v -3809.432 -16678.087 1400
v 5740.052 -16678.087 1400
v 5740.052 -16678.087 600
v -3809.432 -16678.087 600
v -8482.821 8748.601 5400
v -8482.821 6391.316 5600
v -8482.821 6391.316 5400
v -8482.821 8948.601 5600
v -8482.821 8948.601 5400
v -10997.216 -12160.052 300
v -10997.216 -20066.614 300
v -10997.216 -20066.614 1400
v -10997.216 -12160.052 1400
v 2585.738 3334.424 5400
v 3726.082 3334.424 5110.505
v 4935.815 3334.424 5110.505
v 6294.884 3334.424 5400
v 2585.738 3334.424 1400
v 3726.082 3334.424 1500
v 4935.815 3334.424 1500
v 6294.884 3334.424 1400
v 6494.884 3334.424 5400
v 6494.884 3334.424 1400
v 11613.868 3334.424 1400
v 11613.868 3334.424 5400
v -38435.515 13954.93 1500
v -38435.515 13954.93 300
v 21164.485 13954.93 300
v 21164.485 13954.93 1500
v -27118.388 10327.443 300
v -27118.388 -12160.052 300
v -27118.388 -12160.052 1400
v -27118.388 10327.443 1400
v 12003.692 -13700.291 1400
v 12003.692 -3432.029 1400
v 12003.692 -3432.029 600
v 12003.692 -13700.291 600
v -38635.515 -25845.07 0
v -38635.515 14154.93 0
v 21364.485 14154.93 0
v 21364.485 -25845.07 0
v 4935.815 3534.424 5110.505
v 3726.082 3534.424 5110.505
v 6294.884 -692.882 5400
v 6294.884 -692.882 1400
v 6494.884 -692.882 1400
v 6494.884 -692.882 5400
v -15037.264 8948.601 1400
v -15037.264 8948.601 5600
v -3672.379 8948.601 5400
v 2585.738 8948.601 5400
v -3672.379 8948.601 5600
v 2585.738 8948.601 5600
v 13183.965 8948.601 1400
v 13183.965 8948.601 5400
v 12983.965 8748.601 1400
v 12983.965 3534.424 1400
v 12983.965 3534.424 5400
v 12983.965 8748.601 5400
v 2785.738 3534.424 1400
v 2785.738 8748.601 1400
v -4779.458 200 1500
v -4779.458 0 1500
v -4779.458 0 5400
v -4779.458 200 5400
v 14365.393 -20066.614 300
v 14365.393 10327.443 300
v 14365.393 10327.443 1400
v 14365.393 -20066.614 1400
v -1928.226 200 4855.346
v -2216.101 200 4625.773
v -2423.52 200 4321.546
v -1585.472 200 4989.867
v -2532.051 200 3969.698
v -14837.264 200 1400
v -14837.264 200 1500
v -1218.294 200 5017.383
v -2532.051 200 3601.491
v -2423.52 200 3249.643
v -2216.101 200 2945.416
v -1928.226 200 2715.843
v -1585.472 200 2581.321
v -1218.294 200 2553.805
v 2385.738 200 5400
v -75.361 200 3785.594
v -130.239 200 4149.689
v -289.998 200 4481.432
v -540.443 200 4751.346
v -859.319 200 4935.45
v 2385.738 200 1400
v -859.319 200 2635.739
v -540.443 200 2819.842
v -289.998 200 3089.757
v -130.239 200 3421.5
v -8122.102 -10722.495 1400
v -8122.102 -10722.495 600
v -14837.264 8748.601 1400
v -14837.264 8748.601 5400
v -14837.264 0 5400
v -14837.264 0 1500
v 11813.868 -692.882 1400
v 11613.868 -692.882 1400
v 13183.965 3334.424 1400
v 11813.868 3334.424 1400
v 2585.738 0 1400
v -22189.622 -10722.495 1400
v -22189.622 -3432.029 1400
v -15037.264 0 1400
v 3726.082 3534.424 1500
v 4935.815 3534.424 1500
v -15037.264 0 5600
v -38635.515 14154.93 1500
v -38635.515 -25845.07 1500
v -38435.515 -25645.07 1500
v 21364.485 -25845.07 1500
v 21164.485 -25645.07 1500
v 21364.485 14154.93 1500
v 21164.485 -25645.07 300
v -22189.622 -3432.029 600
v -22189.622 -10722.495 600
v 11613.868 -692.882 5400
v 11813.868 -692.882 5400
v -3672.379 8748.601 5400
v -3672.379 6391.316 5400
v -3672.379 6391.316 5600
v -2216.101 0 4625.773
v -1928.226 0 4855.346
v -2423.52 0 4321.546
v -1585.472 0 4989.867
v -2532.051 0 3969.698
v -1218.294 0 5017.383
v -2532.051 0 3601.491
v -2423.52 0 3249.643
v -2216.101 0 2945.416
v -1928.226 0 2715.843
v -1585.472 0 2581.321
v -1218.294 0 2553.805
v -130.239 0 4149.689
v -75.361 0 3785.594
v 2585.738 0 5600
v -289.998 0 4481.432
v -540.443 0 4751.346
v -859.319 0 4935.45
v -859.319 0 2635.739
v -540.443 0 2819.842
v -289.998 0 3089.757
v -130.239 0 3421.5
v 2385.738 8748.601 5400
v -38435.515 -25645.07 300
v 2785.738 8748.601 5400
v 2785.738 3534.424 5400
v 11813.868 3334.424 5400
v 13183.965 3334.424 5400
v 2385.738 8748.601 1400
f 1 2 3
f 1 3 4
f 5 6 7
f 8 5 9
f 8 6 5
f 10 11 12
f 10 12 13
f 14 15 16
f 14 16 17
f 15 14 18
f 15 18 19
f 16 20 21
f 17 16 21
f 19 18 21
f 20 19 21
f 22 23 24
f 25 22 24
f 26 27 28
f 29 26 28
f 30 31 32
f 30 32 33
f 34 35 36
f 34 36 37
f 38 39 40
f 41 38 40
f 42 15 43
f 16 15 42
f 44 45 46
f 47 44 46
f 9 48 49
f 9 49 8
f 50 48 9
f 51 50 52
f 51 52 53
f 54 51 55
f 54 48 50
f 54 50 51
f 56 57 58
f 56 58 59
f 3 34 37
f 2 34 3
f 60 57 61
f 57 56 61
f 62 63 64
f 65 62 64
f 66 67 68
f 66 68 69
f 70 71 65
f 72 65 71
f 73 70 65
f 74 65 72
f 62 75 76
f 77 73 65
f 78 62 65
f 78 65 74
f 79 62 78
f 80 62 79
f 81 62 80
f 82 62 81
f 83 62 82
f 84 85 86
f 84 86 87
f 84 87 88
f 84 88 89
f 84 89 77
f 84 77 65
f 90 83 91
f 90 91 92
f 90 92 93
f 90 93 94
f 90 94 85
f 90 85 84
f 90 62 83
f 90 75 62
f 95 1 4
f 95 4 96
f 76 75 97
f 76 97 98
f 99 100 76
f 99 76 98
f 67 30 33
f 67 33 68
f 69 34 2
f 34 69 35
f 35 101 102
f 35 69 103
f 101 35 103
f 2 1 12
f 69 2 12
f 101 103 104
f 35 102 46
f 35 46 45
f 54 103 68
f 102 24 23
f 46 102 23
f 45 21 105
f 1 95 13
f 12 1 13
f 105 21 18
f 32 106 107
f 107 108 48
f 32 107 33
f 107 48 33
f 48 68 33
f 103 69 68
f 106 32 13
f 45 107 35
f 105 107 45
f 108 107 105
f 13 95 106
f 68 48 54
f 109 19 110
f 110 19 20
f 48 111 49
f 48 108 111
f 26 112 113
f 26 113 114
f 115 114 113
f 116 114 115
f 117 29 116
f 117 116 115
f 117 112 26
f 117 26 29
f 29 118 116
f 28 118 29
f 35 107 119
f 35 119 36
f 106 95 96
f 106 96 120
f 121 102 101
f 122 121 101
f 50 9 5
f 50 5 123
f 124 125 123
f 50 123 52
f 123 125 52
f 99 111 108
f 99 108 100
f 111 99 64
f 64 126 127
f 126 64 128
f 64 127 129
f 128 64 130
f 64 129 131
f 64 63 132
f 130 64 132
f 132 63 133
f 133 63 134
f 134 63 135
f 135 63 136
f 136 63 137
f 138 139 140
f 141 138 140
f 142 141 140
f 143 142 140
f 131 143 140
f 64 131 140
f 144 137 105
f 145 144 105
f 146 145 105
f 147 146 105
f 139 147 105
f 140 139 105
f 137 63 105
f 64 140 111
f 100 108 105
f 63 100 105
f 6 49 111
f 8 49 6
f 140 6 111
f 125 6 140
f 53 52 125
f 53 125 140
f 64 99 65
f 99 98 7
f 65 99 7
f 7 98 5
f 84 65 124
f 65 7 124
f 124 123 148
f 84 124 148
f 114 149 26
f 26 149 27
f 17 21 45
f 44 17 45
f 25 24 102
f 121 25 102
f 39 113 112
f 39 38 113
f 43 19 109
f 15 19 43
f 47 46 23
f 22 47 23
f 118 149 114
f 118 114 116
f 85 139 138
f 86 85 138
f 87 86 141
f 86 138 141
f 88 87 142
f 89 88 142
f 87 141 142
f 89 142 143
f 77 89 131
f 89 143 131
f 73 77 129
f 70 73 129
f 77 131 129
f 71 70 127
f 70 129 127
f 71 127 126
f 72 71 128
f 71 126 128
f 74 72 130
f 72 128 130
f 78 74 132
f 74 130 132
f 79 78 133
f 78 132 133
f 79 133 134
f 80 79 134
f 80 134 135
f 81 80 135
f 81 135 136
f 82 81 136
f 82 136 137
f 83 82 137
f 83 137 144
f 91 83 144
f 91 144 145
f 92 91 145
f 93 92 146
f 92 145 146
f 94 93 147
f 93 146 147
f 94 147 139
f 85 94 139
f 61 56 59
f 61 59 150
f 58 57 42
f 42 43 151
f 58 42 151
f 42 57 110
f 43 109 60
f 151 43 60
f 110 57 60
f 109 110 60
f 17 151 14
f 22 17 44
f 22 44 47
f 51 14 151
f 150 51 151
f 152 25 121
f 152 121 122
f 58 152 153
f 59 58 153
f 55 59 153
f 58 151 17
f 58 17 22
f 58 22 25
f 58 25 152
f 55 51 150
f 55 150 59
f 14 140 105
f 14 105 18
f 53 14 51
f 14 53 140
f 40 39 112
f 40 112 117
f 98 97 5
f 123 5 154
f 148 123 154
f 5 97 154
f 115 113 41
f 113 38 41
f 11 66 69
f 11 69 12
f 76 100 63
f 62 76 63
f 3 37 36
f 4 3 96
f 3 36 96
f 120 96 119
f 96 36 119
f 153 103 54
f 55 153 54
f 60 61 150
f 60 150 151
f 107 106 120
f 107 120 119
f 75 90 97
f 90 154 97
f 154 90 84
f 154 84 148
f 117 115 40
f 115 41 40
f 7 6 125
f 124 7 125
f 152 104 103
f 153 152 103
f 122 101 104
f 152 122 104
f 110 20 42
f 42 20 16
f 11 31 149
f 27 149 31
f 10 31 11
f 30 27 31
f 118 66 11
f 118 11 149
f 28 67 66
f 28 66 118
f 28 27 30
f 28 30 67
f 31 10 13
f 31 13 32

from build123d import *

# Parameters (mm, degrees)
IZIM1_W                     = 60000
IZIM1_H                     = 40000
Y_KSEKLIK_EKSTR_ZYON1_DEPTH = 300
IZIM2_W                     = 60000
IZIM2_H                     = 40000
IZIM2_W_2                   = 59600
IZIM2_H_2                   = 39600
Y_KSEKLIK_EKSTR_ZYON2_DEPTH = 1200
Y_KSEKLIK_EKSTR_ZYON3_DEPTH = 1100
KES_EKSTR_ZYON1_DEPTH       = 800
Y_KSEKLIK_EKSTR_ZYON4_DEPTH = 4000
Y_KSEKLIK_EKSTR_ZYON5_DEPTH = 4000
IZIM8_W                     = 1209.732788708
IZIM8_H                     = 3610.504534554
KES_EKSTR_ZYON2_DEPTH       = 1035
IZIM9_W                     = 17623.002108146
IZIM9_H                     = 8948.600755701
IZIM9_W_2                   = 17223.002108146
IZIM9_H_2                   = 8548.600755701
Y_KSEKLIK_EKSTR_ZYON6_DEPTH = 4000
IZIM10_W                    = 10057.80648616
IZIM10_H                    = 3900
KES_EKSTR_ZYON3_DEPTH       = 1225
IZIM11_W                    = 17623.002108146
IZIM11_H                    = 8948.600755701
Y_KSEKLIK_EKSTR_ZYON7_DEPTH = 200
IZIM12_W                    = 4810.442646605
IZIM12_H                    = 2557.284385886
KES_EKSTR_ZYON4_DEPTH       = 200
IZIM13_R                    = 1235.243034866
KES_EKSTR_ZYON5_DEPTH       = 200


with BuildPart() as part:
    # Çizim1 → Yükseklik-Ekstrüzyon1 (new body)
    with BuildSketch(Plane.XY):
        with Locations((-8635.515452059, -5845.070422535)):
            Rectangle(IZIM1_W, IZIM1_H)
    extrude(amount=Y_KSEKLIK_EKSTR_ZYON1_DEPTH)

    # Çizim2 → Yükseklik-Ekstrüzyon2 (add)
    with BuildSketch(Plane.XY.offset(300)):
        with Locations((-8635.515452059, -5845.070422535)):
            Rectangle(IZIM2_W, IZIM2_H)
        with Locations((-8635.515452059, -5845.070422535)):
            Rectangle(IZIM2_W_2, IZIM2_H_2, mode=Mode.SUBTRACT)
    extrude(amount=Y_KSEKLIK_EKSTR_ZYON2_DEPTH)

    # Çizim4 → Yükseklik-Ekstrüzyon3 (add)
    with BuildSketch(Plane.XY.offset(300)):
        Polygon((-27118.388145752, -12160.051926214), (-27118.388145752, 10327.443184446), (14365.392788981, 10327.443184446), (14365.392788981, -20066.614134071), (-10997.215851809, -20066.614134071), (-10997.215851809, -12160.051926214), align=None)
    extrude(amount=Y_KSEKLIK_EKSTR_ZYON3_DEPTH)

    # Çizim5 → Kes-Ekstrüzyon1 (cut)
    with BuildSketch(Plane.XY.offset(1400)):
        Polygon((-22189.622094101, -3432.028709747), (12003.692389232, -3432.028709747), (12003.692389232, -13700.291317355), (5740.052198591, -16678.087473561), (-3809.432026484, -16678.087473561), (-8122.102321679, -10722.495161149), (-22189.622094101, -10722.495161149), align=None)
    extrude(amount=-KES_EKSTR_ZYON1_DEPTH, mode=Mode.SUBTRACT)

    # Çizim6 → Yükseklik-Ekstrüzyon4 (add)
    with BuildSketch(Plane.XY.offset(1400)):
        Polygon((11813.867998512, -692.882376369), (11813.867998512, 3534.424155195), (6294.884471193, 3534.424155195), (6294.884471193, -692.882376369), (6494.884471193, -692.882376369), (6494.884471193, 3334.424155195), (11613.867998512, 3334.424155195), (11613.867998512, -692.882376369), align=None)
    extrude(amount=Y_KSEKLIK_EKSTR_ZYON4_DEPTH)

    # Çizim7 → Yükseklik-Ekstrüzyon5 (add)
    with BuildSketch(Plane.XY.offset(1400)):
        Polygon((11813.867998512, 3334.424155195), (13183.965395594, 3334.424155195), (13183.965395594, 8948.600755701), (2585.737819961, 8948.600755701), (2585.737819961, 3334.424155195), align=None)
        Polygon((11813.867998512, 3534.424155195), (12983.965395594, 3534.424155195), (12983.965395594, 8748.600755701), (2785.737819961, 8748.600755701), (2785.737819961, 3534.424155195), align=None, mode=Mode.SUBTRACT)
    extrude(amount=Y_KSEKLIK_EKSTR_ZYON5_DEPTH)

    # Çizim8 → Kes-Ekstrüzyon2 (cut)
    with BuildSketch(Plane.XZ.offset(-3334.424155195)):
        with Locations((4330.948838783, 3305.252267277)):
            Rectangle(IZIM8_W, IZIM8_H)
    extrude(amount=-KES_EKSTR_ZYON2_DEPTH, mode=Mode.SUBTRACT)

    # Çizim9 → Yükseklik-Ekstrüzyon6 (add)
    with BuildSketch(Plane.XY.offset(1400)):
        with Locations((-6225.763234112, 4474.30037785)):
            Rectangle(IZIM9_W, IZIM9_H)
        with Locations((-6225.763234112, 4474.30037785)):
            Rectangle(IZIM9_W_2, IZIM9_H_2, mode=Mode.SUBTRACT)
    extrude(amount=Y_KSEKLIK_EKSTR_ZYON6_DEPTH)

    # Çizim10 → Kes-Ekstrüzyon3 (cut)
    with BuildSketch(Plane.XZ):
        with Locations((-9808.361045105, 3450)):
            Rectangle(IZIM10_W, IZIM10_H)
    extrude(amount=-KES_EKSTR_ZYON3_DEPTH, mode=Mode.SUBTRACT)

    # Çizim11 → Yükseklik-Ekstrüzyon7 (add)
    with BuildSketch(Plane.XY.offset(5400)):
        with Locations((-6225.763234112, 4474.30037785)):
            Rectangle(IZIM11_W, IZIM11_H)
    extrude(amount=Y_KSEKLIK_EKSTR_ZYON7_DEPTH)

    # Çizim12 → Kes-Ekstrüzyon4 (cut)
    with BuildSketch(Plane.XY.offset(5600)):
        with Locations((-6077.600034681, 7669.958562758)):
            Rectangle(IZIM12_W, IZIM12_H)
    extrude(amount=-KES_EKSTR_ZYON4_DEPTH, mode=Mode.SUBTRACT)

    # Çizim13 → Kes-Ekstrüzyon5 (cut)
    with BuildSketch(Plane.XZ):
        with Locations((-1310.604150452, 3785.594372986)):
            Circle(IZIM13_R)
    extrude(amount=-KES_EKSTR_ZYON5_DEPTH, mode=Mode.SUBTRACT)


solid = part.part
